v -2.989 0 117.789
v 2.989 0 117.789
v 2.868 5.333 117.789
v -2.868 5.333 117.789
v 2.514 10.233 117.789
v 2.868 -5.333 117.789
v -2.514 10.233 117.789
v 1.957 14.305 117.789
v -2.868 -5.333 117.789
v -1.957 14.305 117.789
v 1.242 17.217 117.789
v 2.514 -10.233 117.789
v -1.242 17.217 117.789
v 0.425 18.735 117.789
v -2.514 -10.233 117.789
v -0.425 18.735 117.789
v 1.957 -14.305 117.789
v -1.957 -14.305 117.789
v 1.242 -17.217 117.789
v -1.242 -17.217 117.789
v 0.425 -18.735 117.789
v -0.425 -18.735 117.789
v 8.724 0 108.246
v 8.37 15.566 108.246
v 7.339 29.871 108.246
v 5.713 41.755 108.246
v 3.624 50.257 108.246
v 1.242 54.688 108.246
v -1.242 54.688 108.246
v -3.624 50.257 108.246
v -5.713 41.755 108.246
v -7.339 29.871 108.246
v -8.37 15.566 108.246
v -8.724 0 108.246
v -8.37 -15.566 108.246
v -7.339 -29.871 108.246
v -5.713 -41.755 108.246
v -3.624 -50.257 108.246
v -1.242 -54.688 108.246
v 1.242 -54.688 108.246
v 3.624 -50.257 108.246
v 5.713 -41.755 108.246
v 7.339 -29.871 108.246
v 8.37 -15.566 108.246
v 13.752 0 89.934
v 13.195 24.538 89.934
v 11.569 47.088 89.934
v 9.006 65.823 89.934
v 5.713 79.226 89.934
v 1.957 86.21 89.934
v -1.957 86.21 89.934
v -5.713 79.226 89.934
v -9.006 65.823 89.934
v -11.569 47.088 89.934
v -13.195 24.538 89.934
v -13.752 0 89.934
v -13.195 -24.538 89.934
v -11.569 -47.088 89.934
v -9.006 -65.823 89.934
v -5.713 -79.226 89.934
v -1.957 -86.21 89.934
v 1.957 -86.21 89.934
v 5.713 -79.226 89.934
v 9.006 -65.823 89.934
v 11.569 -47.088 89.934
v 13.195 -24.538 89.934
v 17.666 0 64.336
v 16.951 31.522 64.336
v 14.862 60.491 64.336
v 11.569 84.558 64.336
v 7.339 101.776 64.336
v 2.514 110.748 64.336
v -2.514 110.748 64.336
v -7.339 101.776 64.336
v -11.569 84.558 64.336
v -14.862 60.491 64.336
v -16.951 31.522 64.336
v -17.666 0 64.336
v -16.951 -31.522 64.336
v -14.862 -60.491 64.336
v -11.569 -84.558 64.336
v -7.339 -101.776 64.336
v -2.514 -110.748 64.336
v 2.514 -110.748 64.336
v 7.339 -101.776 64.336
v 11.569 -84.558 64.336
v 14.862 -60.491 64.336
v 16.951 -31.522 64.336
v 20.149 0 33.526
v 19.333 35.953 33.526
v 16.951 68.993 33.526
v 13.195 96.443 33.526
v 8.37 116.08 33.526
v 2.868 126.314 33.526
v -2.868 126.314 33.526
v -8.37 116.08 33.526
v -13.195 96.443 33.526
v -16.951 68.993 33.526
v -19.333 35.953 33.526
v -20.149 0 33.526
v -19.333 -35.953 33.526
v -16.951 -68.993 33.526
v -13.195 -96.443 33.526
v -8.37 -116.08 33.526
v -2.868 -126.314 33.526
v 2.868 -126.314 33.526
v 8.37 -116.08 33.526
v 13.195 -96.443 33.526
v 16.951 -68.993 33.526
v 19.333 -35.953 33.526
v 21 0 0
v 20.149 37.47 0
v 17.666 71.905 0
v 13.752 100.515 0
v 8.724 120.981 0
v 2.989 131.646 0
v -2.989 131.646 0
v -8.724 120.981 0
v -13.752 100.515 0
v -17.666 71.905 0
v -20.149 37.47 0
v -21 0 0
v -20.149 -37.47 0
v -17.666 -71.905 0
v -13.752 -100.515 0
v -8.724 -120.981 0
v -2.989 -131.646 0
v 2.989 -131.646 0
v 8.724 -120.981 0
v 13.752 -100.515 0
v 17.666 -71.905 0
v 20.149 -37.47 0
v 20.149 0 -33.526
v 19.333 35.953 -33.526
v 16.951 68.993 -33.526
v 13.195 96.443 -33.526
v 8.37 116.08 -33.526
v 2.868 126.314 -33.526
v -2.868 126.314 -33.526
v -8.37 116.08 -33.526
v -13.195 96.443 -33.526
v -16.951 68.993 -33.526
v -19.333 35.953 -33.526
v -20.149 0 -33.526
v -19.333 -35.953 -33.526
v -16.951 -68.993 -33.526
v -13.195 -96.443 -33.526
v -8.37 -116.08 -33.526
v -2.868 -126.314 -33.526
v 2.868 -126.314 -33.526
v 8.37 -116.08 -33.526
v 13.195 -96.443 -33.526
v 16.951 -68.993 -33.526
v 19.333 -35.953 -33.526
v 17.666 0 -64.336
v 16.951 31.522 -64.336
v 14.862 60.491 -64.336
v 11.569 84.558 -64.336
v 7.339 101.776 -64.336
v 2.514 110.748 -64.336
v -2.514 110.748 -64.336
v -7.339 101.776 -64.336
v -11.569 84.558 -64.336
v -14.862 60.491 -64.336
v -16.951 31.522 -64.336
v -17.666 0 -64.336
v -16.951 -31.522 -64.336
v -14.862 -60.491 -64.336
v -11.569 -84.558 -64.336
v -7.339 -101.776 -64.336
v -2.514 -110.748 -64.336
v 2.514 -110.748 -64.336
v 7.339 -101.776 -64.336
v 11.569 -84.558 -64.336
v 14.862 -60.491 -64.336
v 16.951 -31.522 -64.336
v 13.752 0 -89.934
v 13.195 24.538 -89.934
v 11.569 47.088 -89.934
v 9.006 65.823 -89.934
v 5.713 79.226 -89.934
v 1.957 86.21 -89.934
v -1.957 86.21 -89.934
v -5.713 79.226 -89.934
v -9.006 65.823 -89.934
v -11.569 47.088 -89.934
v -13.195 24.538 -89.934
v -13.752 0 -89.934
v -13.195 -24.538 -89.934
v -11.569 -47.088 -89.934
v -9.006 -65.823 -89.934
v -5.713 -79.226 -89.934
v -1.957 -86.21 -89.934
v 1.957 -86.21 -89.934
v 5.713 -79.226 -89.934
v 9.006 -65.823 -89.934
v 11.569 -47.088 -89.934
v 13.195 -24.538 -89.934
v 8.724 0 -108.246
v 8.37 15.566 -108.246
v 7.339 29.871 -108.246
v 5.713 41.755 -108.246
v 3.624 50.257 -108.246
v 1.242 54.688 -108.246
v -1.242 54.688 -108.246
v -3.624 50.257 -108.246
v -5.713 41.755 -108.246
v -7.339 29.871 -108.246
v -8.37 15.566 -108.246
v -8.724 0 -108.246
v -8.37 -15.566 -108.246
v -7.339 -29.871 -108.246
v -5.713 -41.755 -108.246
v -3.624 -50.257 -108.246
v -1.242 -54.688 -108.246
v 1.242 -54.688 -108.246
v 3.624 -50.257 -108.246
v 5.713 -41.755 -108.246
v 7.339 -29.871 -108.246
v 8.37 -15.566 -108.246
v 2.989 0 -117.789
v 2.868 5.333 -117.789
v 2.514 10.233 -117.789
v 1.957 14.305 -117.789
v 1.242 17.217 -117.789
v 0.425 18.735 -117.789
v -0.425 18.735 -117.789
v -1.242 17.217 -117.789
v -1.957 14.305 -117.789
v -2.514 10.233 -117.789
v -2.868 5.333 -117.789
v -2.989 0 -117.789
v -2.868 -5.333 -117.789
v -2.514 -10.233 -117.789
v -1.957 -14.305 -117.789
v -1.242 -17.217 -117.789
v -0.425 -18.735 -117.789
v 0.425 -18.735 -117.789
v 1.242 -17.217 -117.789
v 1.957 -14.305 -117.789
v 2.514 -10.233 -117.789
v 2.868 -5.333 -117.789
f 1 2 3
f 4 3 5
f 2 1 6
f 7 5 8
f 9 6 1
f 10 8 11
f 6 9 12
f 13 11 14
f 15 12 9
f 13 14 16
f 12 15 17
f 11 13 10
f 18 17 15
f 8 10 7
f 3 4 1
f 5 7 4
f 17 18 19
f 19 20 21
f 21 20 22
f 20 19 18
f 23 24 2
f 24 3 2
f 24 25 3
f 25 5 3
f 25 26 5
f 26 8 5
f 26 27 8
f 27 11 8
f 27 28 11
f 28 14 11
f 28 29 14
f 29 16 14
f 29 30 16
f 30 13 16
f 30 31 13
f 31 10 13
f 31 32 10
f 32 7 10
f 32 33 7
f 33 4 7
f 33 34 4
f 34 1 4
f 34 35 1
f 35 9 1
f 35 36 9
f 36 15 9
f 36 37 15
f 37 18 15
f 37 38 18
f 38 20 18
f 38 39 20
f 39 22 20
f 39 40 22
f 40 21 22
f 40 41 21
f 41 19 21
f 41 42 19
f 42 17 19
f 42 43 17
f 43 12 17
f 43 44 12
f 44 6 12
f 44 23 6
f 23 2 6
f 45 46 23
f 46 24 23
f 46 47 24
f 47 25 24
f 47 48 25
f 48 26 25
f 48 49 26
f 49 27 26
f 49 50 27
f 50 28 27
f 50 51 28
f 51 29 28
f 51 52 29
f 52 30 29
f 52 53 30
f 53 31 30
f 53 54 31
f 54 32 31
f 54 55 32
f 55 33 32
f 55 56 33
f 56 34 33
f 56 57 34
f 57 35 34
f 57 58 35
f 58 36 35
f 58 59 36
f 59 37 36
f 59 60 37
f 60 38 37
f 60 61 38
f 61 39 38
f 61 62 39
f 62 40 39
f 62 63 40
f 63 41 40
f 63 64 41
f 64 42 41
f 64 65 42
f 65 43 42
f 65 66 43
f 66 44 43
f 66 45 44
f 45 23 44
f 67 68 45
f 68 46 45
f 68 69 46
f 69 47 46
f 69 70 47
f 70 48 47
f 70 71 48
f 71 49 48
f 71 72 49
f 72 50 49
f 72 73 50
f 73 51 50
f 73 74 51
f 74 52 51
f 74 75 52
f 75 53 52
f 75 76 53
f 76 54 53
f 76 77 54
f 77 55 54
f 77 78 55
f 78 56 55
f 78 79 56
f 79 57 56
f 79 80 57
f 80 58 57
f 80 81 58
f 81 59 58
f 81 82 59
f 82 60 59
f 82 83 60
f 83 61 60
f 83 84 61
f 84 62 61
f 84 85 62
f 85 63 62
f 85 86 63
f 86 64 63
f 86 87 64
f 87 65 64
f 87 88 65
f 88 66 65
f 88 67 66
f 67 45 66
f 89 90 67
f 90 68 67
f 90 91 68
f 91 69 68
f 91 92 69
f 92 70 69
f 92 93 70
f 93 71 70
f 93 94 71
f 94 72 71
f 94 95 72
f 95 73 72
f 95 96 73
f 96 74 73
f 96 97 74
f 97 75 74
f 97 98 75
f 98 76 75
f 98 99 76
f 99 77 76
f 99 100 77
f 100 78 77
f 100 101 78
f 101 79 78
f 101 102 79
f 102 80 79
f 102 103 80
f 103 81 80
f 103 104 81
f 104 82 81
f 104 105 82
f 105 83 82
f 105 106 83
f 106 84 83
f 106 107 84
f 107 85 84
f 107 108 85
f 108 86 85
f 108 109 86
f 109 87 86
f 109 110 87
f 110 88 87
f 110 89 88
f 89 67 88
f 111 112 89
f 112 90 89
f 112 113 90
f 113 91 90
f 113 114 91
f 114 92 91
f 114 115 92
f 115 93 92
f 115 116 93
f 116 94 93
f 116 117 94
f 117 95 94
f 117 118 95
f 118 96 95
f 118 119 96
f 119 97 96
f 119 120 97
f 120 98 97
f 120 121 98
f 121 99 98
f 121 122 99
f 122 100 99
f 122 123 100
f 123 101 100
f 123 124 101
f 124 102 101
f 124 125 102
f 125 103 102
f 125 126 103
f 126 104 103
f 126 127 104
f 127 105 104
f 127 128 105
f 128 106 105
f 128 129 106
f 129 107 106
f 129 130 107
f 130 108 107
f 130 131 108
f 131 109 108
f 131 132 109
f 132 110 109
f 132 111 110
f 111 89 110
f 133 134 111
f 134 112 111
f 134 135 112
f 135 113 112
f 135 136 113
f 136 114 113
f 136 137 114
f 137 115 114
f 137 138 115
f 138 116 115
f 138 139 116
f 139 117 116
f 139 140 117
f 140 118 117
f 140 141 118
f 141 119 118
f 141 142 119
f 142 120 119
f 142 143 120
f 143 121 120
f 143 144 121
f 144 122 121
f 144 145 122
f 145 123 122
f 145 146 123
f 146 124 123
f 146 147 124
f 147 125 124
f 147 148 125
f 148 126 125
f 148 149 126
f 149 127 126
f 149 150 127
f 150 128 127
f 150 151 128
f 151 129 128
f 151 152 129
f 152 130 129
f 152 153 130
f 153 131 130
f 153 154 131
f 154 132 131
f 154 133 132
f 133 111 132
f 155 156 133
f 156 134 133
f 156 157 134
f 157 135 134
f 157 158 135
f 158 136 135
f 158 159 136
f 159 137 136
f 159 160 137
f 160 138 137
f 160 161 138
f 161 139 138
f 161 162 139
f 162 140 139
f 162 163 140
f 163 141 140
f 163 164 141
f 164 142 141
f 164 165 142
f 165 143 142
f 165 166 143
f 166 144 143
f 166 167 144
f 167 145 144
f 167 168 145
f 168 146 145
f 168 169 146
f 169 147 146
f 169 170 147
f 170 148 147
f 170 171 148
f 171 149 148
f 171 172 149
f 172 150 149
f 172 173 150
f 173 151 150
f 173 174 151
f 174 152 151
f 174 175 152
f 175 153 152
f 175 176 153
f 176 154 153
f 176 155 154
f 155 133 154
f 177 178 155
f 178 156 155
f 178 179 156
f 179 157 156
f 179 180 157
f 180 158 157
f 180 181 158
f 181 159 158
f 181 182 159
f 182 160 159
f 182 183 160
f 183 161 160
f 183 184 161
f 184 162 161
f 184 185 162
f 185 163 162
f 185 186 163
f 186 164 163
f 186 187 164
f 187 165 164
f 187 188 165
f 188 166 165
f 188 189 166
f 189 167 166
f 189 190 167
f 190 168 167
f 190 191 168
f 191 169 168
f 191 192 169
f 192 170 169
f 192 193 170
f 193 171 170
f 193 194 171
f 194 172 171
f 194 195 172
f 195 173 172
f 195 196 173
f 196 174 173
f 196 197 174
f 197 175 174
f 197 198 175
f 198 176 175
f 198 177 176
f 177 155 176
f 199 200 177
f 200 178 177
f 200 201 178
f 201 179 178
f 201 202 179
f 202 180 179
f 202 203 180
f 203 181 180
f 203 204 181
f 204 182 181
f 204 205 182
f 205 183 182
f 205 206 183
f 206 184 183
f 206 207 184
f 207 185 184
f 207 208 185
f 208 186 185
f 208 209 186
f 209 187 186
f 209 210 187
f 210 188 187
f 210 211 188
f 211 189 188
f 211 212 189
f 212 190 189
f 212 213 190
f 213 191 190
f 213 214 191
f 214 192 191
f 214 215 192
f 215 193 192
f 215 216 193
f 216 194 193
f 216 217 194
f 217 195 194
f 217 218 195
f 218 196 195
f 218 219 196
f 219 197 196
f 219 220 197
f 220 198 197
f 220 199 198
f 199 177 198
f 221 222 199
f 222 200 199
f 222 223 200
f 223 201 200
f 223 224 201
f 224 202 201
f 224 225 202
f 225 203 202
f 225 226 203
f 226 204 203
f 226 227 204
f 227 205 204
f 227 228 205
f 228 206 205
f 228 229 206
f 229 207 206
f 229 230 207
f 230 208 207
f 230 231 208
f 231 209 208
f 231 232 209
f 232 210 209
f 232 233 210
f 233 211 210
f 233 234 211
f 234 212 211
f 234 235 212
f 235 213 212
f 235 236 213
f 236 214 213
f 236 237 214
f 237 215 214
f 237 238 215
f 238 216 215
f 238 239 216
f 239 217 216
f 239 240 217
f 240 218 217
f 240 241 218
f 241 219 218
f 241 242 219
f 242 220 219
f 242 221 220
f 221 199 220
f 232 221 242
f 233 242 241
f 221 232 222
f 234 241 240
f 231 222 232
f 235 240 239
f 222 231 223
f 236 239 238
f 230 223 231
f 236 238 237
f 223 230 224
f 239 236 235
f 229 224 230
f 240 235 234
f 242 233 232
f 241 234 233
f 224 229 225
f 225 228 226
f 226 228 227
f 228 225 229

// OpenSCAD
// Generated by SolidPython 1.0.1 on 2020-07-29 00:46:46


scale(v = [3, 19, 17]) {
	sphere(r = 7);
}
/***********************************************
*********      SolidPython code:      **********
************************************************
 
# import packages: SolidPython
from solid import *
from solid.utils import *
from itertools import chain, combinations, permutations


class Resize:

    def __init__(self, scad_file):
        self.scad_file = scad_file
        #self.scad_file = import_scad(scad_file)
        # cone/cylinder param:
        self.r1 = 0
        self.r2 = 0
        self.h = 0
        # rectangular prism param:
        self.w = 0
        self.l = 0
        # ellipse param:
        self.r = 0

    # import OpenScad code (file name corresponds to shape)


    # classify shape + parameters
    def assign(self, param1, param2, param3):
        if self.scad_file == 'cone.scad':
            self.r1 = param1
            self.r2 = param2
            self.h = param3
        elif self.scad_file == 'cylinder.scad':
            self.r1 = param1
            self.r2 = param2
            self.h = param3
        elif self.scad_file == 'rectangularPrism.scad':
            self.h = param1
            self.l = param2
            self.w = param3
        else:
            self.r = param1
            self.h = param2

    # resize parameters
    def iterate(self):
        x = range(3, 20, 2)
        i = 1
        if self.scad_file == 'cone.scad':
            tempList = list(permutations(x, 2))
            for temp in tempList:
                param1 = temp[0]
                param2 = temp[1]
                filepath = 'produced_scad_files/' + 'cone' + str(param1) + '_' + str(param2) + '_' + '.scad'
                scad_render_to_file(cylinder(h=param1, r1=param2, r2=0), filepath)

        elif self.scad_file == 'cylinder.scad':
            tempList = list(permutations(x, 3))
            for temp in tempList:
                param1 = temp[0]
                param2 = temp[1]
                filepath = 'produced_scad_files/' + 'cylinder' + str(param1) + '_' + str(param2) + '_' + '.scad'
                scad_render_to_file(cylinder(h=param1, r1=param2, r2=param2), filepath)

        elif self.scad_file == 'rectangularPrism.scad':
            tempList = list(permutations(x, 3))
            for temp in tempList:
                param1 = temp[0]
                param2 = temp[1]
                param3 = temp[2]
                filepath = 'produced_scad_files/' + 'rectangularPrism' + str(param1) + '_' + str(param2) + '_' + str(
                    param3) + '.scad'
                scad_render_to_file(cube(size=(param1, param2, param3)), filepath)

        elif self.scad_file == 'ellipse.scad':
            tempList = list(permutations(x, 4))
            for temp in tempList:
                param1 = temp[0]
                param2 = temp[1]
                param3 = temp[2]
                param4 = temp[3]
                filepath = 'produced_scad_files/' + 'ellipse' + str(param1) + '_' + str(param2) + '_' + str(param3) + '_' + str(param4) + '.scad'
                scad_render_to_file(scale([param1, param2, param3])(sphere(r=param4)), filepath)

    def render_to_scadfile(self):
        scad_render_to_file(scad, 'example.scad') 
 
************************************************/
